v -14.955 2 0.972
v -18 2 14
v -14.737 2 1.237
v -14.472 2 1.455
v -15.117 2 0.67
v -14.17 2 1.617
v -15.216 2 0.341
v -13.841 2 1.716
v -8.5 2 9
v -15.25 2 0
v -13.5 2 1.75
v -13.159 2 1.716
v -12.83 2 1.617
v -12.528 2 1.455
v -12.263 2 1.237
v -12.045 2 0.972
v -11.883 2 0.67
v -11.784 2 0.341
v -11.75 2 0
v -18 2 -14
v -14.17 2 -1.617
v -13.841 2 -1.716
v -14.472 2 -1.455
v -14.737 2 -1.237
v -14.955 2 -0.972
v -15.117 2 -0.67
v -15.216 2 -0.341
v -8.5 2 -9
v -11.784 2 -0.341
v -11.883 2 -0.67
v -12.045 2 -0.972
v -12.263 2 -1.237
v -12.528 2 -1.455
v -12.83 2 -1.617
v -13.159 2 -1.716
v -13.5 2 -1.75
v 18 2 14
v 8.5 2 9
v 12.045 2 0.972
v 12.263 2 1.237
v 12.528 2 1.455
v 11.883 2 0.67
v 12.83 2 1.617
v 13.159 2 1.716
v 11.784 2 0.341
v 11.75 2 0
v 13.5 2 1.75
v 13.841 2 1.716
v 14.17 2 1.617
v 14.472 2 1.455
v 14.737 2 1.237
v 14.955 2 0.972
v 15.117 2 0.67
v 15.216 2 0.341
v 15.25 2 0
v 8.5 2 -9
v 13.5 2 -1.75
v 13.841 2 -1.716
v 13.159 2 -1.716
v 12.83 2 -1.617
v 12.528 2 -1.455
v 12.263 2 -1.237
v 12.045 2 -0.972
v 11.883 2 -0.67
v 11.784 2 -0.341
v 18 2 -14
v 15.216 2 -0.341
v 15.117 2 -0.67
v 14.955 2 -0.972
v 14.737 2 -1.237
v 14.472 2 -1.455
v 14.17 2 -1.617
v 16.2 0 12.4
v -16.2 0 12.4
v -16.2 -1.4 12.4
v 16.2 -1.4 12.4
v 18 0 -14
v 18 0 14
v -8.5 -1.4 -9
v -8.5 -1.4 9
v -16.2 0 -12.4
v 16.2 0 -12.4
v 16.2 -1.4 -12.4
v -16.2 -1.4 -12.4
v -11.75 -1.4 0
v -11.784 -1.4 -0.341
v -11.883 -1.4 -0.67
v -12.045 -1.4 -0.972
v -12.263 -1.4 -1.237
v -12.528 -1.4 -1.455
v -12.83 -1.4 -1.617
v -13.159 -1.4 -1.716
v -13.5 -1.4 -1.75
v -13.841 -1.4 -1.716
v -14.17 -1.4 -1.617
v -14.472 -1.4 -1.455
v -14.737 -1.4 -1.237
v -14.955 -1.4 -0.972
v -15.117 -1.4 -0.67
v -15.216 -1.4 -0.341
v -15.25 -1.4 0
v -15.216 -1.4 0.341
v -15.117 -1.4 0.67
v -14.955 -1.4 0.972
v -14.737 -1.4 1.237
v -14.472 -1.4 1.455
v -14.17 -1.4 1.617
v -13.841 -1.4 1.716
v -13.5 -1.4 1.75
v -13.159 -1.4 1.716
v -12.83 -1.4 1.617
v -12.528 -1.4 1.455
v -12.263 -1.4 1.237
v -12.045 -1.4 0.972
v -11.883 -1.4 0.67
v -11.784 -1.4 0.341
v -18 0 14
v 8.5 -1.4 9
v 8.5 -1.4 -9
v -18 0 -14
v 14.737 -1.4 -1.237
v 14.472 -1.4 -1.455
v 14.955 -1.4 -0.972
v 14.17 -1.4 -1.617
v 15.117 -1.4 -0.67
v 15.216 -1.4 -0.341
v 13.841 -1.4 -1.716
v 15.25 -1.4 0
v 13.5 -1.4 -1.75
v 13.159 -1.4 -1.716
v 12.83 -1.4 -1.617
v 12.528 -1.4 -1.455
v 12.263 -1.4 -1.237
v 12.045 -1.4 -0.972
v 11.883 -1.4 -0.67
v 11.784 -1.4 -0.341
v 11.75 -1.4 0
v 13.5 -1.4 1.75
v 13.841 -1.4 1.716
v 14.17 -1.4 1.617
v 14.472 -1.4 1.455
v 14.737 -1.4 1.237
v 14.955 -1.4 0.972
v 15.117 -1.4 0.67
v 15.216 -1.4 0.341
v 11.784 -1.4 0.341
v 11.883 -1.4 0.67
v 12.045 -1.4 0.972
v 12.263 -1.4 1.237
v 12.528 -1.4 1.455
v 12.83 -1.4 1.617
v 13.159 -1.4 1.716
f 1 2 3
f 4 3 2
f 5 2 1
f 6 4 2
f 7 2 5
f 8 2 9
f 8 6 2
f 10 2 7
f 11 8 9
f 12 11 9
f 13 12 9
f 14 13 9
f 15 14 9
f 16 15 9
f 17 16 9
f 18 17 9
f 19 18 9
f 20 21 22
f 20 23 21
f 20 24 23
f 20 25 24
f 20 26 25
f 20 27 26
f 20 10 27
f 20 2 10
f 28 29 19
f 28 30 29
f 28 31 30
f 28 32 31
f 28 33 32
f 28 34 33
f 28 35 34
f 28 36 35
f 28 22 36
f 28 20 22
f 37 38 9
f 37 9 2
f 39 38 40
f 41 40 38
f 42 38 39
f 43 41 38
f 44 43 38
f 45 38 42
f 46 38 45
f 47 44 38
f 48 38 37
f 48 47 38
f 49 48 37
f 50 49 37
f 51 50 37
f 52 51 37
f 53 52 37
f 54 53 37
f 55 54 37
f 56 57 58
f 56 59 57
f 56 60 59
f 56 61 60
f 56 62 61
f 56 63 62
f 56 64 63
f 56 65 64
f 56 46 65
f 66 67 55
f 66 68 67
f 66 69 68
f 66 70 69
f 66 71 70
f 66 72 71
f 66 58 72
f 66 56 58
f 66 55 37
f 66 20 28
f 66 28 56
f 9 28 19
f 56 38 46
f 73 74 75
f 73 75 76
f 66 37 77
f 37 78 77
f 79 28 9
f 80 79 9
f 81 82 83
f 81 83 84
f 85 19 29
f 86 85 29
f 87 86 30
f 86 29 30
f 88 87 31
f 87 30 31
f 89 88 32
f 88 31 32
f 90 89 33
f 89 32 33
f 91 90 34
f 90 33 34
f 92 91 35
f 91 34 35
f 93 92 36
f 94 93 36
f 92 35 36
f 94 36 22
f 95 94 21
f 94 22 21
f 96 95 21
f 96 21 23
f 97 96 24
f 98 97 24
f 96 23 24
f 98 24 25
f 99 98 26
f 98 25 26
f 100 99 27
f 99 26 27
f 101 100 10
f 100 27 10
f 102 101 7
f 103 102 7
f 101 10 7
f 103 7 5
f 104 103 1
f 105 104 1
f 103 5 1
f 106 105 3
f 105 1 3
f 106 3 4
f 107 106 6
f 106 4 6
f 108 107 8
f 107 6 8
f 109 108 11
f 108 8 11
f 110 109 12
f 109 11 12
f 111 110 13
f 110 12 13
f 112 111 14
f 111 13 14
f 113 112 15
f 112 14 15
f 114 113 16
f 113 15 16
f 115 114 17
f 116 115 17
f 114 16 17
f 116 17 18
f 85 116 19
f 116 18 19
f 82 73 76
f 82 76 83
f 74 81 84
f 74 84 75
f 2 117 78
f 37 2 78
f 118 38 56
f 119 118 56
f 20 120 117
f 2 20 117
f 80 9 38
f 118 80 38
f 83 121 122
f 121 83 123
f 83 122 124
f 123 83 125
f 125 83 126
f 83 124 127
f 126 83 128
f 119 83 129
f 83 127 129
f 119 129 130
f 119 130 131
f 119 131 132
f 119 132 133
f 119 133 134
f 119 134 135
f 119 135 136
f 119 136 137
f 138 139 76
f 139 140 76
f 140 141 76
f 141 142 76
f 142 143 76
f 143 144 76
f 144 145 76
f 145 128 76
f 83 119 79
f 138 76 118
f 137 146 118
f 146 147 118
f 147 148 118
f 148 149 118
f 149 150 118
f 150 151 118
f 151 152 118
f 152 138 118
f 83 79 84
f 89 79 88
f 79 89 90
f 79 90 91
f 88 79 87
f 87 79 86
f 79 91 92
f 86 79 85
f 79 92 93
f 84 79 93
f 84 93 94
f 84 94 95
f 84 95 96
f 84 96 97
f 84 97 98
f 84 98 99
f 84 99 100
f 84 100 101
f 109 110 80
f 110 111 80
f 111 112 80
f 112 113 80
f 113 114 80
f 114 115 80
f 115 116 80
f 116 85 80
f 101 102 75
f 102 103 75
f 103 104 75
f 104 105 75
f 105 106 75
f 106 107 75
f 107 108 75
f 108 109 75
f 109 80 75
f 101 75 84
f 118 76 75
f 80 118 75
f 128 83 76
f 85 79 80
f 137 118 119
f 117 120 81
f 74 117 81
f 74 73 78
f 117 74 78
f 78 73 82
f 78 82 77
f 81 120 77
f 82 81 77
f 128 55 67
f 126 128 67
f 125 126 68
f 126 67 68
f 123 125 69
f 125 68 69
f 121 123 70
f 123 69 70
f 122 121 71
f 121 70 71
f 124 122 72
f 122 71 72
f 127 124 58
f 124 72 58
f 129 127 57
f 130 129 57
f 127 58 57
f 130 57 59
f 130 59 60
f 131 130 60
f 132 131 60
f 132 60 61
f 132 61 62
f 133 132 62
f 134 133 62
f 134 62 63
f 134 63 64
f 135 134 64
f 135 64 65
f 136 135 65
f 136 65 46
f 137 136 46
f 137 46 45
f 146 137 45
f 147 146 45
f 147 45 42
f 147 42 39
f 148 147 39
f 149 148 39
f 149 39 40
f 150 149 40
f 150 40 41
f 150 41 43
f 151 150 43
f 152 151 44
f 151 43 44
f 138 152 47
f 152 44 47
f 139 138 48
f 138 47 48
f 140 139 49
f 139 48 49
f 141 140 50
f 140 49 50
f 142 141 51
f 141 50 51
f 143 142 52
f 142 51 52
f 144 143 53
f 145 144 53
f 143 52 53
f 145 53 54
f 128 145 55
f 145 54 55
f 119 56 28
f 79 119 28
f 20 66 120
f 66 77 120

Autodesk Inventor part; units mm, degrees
ref_plane "YZ Plane" through (0, 0, 0) normal (1, 0, 0) x (0, 1, 0)
ref_plane "XZ Plane" through (0, 0, 0) normal (0, 1, 0) x (-1, 0, 0)
ref_plane "XY Plane" through (0, 0, 0) normal (0, 0, 1) x (1, 0, 0)
sketch "Sketch1" plane through (0, 0, 0) normal (0, 1, 0) x (-1, 0, 0)
  line L0 (16.2, 12.4) -> (-16.2, 12.4)
  line L1 (-16.2, 12.4) -> (-16.2, -12.4)
  line L2 (-16.2, -12.4) -> (16.2, -12.4)
  line L3 (16.2, -12.4) -> (16.2, 12.4)
  line L4 (16.2, 12.4) -> (-16.2, -12.4) construction
  line L5 (-16.2, 12.4) -> (16.2, -12.4) construction
  point P0 (0, 0)
  dimension "d0" = 32.4
  dimension "d1" = 24.8
extrude "Extrusion1" add sketch "Sketch1" against normal blind 1.4
sketch "Sketch2" plane through (0, 0, 0) normal (0, 1, 0) x (1, 0, 0)
  line L0 (-18, -14) -> (18, -14)
  line L1 (18, -14) -> (18, 14)
  line L2 (18, 14) -> (-18, 14)
  line L3 (-18, 14) -> (-18, -14)
  line L4 (-18, -14) -> (18, 14) construction
  line L5 (18, -14) -> (-18, 14) construction
  point P0 (0, 0)
  dimension "d4" = 36
  dimension "d5" = 28
extrude "Extrusion2" add sketch "Sketch2" along normal blind 2
sketch "Sketch3" plane through (0, 2, 0) normal (0, 1, 0) x (1, 0, 0)
  line L0 (-8.5, -9) -> (8.5, -9)
  line L1 (8.5, -9) -> (8.5, 9)
  line L2 (8.5, 9) -> (-8.5, 9)
  line L3 (-8.5, 9) -> (-8.5, -9)
  line L4 (-8.5, -9) -> (8.5, 9) construction
  line L5 (8.5, -9) -> (-8.5, 9) construction
  circle A0 centre (-13.5, 0) radius 1.75
  circle A1 centre (13.5, 0) radius 1.75
  point P0 (0, 0)
  dimension "d8" = 17
  dimension "d9" = 18
  dimension "d10" = 13.5
  dimension "d11" = 13.5
  dimension "d12" = 3.5
  dimension "d13" = 3.5
extrude "Extrusion3" cut sketch "Sketch3" against normal up to surface (3.4 mm away)
equation "\"d11\" = d10"
properties part number "network panel_3DPrint"
